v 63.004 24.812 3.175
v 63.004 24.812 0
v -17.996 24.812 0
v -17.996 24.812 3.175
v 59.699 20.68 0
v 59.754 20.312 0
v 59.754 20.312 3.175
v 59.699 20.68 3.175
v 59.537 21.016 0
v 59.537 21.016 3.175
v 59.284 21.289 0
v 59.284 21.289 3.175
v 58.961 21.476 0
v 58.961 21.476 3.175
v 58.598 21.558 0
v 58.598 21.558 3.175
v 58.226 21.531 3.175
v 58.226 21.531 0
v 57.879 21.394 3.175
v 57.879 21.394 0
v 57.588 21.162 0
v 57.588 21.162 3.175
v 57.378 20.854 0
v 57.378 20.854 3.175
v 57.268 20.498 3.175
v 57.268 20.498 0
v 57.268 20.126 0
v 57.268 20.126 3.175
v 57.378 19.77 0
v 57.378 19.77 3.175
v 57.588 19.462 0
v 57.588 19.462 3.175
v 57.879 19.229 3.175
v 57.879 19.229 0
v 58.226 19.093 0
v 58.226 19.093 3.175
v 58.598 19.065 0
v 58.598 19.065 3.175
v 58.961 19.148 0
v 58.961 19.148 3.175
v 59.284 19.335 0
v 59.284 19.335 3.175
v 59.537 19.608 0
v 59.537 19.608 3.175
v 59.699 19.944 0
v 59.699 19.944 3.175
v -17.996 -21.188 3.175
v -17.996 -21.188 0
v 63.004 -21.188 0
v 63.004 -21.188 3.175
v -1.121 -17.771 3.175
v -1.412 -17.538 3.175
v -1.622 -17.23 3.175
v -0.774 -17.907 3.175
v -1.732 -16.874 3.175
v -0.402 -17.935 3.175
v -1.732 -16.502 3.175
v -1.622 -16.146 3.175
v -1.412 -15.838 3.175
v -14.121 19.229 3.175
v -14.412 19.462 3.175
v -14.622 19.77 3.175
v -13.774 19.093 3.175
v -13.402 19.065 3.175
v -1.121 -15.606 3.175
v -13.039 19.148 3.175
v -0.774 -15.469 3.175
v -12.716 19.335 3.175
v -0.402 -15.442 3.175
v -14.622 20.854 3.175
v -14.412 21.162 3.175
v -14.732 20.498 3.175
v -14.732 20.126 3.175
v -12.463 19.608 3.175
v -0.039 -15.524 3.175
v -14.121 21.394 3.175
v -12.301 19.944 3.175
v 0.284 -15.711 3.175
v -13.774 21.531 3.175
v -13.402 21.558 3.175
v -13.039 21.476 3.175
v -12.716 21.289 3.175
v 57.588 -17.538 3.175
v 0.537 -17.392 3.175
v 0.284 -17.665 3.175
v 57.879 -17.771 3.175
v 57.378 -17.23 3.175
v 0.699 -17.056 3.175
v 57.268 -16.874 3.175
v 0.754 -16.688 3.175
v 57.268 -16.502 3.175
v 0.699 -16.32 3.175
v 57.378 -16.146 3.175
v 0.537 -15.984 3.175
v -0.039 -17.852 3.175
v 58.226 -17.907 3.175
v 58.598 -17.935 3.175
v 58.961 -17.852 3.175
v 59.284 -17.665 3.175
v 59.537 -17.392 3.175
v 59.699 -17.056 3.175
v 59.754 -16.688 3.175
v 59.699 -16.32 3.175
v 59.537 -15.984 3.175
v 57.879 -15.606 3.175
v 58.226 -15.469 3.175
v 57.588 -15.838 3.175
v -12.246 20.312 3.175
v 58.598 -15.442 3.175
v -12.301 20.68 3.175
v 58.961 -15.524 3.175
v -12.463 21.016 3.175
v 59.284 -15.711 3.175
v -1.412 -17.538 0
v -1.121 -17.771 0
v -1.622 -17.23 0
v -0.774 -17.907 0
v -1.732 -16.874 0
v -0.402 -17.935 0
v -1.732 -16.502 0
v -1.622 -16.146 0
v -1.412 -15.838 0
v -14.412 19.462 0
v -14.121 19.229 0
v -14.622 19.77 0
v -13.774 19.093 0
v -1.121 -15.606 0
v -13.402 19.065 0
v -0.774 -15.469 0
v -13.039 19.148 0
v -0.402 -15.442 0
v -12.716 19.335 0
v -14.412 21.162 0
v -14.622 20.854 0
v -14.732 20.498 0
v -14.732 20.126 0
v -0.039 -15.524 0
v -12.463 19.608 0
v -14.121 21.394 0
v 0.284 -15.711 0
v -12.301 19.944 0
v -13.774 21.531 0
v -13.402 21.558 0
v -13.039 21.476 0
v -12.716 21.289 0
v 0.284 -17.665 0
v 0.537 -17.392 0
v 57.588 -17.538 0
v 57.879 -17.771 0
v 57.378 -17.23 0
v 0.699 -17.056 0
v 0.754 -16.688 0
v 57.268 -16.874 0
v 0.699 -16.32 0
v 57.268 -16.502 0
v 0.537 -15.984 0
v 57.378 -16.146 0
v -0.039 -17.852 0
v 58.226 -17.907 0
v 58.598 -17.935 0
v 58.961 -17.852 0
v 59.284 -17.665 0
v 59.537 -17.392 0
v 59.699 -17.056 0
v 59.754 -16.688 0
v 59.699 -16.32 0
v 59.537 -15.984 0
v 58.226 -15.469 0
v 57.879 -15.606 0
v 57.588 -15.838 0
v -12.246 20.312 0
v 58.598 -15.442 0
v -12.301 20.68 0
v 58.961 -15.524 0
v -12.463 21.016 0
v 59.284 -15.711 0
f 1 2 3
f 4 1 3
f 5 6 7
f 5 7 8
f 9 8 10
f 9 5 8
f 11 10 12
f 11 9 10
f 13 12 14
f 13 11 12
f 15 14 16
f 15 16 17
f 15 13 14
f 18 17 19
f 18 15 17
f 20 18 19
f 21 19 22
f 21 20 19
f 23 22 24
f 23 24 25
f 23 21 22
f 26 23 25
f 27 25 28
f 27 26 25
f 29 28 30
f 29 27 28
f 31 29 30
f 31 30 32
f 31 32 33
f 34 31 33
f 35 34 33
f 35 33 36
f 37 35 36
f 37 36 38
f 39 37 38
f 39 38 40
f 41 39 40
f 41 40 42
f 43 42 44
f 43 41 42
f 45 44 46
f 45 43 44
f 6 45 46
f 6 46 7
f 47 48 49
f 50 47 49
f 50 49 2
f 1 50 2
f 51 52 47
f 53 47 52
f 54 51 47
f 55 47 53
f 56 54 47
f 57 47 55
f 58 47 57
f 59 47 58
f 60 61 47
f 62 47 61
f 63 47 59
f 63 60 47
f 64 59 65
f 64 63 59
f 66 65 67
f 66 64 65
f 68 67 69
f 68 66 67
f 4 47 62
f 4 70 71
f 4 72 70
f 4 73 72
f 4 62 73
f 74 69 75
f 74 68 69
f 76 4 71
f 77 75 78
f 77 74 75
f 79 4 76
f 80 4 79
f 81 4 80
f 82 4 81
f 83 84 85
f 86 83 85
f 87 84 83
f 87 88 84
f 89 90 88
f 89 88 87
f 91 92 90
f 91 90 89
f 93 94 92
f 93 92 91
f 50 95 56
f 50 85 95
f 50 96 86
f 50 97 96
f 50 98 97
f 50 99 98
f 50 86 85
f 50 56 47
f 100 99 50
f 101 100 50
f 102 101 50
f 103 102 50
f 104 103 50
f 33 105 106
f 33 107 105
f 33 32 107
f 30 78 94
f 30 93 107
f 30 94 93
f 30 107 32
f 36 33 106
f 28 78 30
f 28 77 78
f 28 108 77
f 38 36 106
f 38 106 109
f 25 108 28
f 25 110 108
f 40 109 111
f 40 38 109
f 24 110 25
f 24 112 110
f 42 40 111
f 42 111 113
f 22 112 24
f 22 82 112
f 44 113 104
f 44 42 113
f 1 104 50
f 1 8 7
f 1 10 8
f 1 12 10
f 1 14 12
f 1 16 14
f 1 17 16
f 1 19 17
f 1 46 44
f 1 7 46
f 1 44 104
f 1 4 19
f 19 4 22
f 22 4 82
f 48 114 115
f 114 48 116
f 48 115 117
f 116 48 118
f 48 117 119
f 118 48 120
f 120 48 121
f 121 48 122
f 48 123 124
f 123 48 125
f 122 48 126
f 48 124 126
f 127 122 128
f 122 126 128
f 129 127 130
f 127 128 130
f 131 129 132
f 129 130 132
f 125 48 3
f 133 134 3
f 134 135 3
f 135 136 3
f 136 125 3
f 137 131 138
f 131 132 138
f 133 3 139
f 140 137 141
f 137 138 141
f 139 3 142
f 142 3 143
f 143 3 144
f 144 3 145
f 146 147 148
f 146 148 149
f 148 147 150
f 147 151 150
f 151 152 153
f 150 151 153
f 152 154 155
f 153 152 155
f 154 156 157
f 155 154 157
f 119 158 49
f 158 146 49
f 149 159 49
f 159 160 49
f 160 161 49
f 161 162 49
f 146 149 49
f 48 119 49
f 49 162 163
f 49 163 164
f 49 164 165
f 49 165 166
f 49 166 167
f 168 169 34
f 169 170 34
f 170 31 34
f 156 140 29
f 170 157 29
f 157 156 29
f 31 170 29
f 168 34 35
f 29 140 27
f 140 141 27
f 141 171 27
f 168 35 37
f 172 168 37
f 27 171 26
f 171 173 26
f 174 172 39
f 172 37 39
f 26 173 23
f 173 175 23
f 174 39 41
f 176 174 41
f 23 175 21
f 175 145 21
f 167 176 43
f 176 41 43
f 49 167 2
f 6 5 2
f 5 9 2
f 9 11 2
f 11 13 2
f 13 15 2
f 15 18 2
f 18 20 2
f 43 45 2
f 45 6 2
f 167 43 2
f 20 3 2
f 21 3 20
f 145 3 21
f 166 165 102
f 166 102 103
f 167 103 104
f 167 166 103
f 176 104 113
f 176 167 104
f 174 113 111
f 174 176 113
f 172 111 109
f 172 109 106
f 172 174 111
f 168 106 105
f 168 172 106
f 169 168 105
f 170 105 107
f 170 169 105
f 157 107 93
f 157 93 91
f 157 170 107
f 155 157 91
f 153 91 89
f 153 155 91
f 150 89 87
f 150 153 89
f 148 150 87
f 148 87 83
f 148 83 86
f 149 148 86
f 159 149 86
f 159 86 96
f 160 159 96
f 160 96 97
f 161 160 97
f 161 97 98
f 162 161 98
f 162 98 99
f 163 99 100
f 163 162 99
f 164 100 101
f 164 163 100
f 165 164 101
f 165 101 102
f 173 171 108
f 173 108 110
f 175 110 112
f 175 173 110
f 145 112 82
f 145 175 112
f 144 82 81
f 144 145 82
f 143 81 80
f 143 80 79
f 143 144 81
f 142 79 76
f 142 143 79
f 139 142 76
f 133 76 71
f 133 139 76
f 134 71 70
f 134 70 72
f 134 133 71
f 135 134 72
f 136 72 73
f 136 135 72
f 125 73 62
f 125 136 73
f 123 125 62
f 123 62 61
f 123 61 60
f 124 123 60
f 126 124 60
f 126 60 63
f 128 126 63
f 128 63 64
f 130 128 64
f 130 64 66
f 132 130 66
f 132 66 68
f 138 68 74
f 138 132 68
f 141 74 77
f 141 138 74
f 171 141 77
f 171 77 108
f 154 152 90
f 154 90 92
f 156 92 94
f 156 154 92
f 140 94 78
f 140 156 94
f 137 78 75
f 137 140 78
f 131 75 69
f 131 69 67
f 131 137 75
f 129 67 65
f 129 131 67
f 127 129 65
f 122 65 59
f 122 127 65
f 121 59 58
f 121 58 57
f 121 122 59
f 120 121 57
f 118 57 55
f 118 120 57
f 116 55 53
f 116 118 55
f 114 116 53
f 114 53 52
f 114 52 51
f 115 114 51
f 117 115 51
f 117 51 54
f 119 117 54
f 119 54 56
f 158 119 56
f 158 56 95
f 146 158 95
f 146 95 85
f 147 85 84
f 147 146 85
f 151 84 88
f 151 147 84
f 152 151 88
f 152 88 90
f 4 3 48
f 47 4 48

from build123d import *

# Parameters (mm, degrees)
F0_R     = 1.25
F0_W     = 68
F0_H     = 9
F1_DEPTH = 3.175


# Not quite as in the source:
# - a length typed as a fraction of an inch, garbled in the dataset ("3 / 203.2 mm" for 3/8 in), is restored
# - a feature names something its author has since deleted; it is built from what else it names


with BuildPart() as f1:
    # F0 (on Top) → F1 (new body)
    with BuildSketch(Plane.XY):
        Polygon((63.0042573512, 24.8119444549), (-17.9957426488, 24.8119444549), (-17.9957426488, 15.8119444549), (22.5042573512, 15.8119444549), (63.0042573512, 15.8119444549), align=None)
        with Locations((-13.4957426488, 20.3119444549)):
            Circle(F0_R, mode=Mode.SUBTRACT)
        with Locations((58.5042573512, 20.3119444549)):
            Circle(F0_R, mode=Mode.SUBTRACT)
        Polygon((22.5042573512, 15.8119444549), (-17.9957426488, 15.8119444549), (-17.9957426488, -21.1880555451), (-4.9957426488, -21.1880555451), (-4.9957426488, -12.1880555451), (63.0042573512, -12.1880555451), (63.0042573512, 15.8119444549), align=None)
        with Locations((29.0042573512, -16.6880555451)):
            Rectangle(F0_W, F0_H)
        with Locations((-0.4957426488, -16.6880555451)):
            Circle(F0_R, mode=Mode.SUBTRACT)
        with Locations((58.5042573512, -16.6880555451)):
            Circle(F0_R, mode=Mode.SUBTRACT)
    extrude(amount=F1_DEPTH)


solid = f1.part
